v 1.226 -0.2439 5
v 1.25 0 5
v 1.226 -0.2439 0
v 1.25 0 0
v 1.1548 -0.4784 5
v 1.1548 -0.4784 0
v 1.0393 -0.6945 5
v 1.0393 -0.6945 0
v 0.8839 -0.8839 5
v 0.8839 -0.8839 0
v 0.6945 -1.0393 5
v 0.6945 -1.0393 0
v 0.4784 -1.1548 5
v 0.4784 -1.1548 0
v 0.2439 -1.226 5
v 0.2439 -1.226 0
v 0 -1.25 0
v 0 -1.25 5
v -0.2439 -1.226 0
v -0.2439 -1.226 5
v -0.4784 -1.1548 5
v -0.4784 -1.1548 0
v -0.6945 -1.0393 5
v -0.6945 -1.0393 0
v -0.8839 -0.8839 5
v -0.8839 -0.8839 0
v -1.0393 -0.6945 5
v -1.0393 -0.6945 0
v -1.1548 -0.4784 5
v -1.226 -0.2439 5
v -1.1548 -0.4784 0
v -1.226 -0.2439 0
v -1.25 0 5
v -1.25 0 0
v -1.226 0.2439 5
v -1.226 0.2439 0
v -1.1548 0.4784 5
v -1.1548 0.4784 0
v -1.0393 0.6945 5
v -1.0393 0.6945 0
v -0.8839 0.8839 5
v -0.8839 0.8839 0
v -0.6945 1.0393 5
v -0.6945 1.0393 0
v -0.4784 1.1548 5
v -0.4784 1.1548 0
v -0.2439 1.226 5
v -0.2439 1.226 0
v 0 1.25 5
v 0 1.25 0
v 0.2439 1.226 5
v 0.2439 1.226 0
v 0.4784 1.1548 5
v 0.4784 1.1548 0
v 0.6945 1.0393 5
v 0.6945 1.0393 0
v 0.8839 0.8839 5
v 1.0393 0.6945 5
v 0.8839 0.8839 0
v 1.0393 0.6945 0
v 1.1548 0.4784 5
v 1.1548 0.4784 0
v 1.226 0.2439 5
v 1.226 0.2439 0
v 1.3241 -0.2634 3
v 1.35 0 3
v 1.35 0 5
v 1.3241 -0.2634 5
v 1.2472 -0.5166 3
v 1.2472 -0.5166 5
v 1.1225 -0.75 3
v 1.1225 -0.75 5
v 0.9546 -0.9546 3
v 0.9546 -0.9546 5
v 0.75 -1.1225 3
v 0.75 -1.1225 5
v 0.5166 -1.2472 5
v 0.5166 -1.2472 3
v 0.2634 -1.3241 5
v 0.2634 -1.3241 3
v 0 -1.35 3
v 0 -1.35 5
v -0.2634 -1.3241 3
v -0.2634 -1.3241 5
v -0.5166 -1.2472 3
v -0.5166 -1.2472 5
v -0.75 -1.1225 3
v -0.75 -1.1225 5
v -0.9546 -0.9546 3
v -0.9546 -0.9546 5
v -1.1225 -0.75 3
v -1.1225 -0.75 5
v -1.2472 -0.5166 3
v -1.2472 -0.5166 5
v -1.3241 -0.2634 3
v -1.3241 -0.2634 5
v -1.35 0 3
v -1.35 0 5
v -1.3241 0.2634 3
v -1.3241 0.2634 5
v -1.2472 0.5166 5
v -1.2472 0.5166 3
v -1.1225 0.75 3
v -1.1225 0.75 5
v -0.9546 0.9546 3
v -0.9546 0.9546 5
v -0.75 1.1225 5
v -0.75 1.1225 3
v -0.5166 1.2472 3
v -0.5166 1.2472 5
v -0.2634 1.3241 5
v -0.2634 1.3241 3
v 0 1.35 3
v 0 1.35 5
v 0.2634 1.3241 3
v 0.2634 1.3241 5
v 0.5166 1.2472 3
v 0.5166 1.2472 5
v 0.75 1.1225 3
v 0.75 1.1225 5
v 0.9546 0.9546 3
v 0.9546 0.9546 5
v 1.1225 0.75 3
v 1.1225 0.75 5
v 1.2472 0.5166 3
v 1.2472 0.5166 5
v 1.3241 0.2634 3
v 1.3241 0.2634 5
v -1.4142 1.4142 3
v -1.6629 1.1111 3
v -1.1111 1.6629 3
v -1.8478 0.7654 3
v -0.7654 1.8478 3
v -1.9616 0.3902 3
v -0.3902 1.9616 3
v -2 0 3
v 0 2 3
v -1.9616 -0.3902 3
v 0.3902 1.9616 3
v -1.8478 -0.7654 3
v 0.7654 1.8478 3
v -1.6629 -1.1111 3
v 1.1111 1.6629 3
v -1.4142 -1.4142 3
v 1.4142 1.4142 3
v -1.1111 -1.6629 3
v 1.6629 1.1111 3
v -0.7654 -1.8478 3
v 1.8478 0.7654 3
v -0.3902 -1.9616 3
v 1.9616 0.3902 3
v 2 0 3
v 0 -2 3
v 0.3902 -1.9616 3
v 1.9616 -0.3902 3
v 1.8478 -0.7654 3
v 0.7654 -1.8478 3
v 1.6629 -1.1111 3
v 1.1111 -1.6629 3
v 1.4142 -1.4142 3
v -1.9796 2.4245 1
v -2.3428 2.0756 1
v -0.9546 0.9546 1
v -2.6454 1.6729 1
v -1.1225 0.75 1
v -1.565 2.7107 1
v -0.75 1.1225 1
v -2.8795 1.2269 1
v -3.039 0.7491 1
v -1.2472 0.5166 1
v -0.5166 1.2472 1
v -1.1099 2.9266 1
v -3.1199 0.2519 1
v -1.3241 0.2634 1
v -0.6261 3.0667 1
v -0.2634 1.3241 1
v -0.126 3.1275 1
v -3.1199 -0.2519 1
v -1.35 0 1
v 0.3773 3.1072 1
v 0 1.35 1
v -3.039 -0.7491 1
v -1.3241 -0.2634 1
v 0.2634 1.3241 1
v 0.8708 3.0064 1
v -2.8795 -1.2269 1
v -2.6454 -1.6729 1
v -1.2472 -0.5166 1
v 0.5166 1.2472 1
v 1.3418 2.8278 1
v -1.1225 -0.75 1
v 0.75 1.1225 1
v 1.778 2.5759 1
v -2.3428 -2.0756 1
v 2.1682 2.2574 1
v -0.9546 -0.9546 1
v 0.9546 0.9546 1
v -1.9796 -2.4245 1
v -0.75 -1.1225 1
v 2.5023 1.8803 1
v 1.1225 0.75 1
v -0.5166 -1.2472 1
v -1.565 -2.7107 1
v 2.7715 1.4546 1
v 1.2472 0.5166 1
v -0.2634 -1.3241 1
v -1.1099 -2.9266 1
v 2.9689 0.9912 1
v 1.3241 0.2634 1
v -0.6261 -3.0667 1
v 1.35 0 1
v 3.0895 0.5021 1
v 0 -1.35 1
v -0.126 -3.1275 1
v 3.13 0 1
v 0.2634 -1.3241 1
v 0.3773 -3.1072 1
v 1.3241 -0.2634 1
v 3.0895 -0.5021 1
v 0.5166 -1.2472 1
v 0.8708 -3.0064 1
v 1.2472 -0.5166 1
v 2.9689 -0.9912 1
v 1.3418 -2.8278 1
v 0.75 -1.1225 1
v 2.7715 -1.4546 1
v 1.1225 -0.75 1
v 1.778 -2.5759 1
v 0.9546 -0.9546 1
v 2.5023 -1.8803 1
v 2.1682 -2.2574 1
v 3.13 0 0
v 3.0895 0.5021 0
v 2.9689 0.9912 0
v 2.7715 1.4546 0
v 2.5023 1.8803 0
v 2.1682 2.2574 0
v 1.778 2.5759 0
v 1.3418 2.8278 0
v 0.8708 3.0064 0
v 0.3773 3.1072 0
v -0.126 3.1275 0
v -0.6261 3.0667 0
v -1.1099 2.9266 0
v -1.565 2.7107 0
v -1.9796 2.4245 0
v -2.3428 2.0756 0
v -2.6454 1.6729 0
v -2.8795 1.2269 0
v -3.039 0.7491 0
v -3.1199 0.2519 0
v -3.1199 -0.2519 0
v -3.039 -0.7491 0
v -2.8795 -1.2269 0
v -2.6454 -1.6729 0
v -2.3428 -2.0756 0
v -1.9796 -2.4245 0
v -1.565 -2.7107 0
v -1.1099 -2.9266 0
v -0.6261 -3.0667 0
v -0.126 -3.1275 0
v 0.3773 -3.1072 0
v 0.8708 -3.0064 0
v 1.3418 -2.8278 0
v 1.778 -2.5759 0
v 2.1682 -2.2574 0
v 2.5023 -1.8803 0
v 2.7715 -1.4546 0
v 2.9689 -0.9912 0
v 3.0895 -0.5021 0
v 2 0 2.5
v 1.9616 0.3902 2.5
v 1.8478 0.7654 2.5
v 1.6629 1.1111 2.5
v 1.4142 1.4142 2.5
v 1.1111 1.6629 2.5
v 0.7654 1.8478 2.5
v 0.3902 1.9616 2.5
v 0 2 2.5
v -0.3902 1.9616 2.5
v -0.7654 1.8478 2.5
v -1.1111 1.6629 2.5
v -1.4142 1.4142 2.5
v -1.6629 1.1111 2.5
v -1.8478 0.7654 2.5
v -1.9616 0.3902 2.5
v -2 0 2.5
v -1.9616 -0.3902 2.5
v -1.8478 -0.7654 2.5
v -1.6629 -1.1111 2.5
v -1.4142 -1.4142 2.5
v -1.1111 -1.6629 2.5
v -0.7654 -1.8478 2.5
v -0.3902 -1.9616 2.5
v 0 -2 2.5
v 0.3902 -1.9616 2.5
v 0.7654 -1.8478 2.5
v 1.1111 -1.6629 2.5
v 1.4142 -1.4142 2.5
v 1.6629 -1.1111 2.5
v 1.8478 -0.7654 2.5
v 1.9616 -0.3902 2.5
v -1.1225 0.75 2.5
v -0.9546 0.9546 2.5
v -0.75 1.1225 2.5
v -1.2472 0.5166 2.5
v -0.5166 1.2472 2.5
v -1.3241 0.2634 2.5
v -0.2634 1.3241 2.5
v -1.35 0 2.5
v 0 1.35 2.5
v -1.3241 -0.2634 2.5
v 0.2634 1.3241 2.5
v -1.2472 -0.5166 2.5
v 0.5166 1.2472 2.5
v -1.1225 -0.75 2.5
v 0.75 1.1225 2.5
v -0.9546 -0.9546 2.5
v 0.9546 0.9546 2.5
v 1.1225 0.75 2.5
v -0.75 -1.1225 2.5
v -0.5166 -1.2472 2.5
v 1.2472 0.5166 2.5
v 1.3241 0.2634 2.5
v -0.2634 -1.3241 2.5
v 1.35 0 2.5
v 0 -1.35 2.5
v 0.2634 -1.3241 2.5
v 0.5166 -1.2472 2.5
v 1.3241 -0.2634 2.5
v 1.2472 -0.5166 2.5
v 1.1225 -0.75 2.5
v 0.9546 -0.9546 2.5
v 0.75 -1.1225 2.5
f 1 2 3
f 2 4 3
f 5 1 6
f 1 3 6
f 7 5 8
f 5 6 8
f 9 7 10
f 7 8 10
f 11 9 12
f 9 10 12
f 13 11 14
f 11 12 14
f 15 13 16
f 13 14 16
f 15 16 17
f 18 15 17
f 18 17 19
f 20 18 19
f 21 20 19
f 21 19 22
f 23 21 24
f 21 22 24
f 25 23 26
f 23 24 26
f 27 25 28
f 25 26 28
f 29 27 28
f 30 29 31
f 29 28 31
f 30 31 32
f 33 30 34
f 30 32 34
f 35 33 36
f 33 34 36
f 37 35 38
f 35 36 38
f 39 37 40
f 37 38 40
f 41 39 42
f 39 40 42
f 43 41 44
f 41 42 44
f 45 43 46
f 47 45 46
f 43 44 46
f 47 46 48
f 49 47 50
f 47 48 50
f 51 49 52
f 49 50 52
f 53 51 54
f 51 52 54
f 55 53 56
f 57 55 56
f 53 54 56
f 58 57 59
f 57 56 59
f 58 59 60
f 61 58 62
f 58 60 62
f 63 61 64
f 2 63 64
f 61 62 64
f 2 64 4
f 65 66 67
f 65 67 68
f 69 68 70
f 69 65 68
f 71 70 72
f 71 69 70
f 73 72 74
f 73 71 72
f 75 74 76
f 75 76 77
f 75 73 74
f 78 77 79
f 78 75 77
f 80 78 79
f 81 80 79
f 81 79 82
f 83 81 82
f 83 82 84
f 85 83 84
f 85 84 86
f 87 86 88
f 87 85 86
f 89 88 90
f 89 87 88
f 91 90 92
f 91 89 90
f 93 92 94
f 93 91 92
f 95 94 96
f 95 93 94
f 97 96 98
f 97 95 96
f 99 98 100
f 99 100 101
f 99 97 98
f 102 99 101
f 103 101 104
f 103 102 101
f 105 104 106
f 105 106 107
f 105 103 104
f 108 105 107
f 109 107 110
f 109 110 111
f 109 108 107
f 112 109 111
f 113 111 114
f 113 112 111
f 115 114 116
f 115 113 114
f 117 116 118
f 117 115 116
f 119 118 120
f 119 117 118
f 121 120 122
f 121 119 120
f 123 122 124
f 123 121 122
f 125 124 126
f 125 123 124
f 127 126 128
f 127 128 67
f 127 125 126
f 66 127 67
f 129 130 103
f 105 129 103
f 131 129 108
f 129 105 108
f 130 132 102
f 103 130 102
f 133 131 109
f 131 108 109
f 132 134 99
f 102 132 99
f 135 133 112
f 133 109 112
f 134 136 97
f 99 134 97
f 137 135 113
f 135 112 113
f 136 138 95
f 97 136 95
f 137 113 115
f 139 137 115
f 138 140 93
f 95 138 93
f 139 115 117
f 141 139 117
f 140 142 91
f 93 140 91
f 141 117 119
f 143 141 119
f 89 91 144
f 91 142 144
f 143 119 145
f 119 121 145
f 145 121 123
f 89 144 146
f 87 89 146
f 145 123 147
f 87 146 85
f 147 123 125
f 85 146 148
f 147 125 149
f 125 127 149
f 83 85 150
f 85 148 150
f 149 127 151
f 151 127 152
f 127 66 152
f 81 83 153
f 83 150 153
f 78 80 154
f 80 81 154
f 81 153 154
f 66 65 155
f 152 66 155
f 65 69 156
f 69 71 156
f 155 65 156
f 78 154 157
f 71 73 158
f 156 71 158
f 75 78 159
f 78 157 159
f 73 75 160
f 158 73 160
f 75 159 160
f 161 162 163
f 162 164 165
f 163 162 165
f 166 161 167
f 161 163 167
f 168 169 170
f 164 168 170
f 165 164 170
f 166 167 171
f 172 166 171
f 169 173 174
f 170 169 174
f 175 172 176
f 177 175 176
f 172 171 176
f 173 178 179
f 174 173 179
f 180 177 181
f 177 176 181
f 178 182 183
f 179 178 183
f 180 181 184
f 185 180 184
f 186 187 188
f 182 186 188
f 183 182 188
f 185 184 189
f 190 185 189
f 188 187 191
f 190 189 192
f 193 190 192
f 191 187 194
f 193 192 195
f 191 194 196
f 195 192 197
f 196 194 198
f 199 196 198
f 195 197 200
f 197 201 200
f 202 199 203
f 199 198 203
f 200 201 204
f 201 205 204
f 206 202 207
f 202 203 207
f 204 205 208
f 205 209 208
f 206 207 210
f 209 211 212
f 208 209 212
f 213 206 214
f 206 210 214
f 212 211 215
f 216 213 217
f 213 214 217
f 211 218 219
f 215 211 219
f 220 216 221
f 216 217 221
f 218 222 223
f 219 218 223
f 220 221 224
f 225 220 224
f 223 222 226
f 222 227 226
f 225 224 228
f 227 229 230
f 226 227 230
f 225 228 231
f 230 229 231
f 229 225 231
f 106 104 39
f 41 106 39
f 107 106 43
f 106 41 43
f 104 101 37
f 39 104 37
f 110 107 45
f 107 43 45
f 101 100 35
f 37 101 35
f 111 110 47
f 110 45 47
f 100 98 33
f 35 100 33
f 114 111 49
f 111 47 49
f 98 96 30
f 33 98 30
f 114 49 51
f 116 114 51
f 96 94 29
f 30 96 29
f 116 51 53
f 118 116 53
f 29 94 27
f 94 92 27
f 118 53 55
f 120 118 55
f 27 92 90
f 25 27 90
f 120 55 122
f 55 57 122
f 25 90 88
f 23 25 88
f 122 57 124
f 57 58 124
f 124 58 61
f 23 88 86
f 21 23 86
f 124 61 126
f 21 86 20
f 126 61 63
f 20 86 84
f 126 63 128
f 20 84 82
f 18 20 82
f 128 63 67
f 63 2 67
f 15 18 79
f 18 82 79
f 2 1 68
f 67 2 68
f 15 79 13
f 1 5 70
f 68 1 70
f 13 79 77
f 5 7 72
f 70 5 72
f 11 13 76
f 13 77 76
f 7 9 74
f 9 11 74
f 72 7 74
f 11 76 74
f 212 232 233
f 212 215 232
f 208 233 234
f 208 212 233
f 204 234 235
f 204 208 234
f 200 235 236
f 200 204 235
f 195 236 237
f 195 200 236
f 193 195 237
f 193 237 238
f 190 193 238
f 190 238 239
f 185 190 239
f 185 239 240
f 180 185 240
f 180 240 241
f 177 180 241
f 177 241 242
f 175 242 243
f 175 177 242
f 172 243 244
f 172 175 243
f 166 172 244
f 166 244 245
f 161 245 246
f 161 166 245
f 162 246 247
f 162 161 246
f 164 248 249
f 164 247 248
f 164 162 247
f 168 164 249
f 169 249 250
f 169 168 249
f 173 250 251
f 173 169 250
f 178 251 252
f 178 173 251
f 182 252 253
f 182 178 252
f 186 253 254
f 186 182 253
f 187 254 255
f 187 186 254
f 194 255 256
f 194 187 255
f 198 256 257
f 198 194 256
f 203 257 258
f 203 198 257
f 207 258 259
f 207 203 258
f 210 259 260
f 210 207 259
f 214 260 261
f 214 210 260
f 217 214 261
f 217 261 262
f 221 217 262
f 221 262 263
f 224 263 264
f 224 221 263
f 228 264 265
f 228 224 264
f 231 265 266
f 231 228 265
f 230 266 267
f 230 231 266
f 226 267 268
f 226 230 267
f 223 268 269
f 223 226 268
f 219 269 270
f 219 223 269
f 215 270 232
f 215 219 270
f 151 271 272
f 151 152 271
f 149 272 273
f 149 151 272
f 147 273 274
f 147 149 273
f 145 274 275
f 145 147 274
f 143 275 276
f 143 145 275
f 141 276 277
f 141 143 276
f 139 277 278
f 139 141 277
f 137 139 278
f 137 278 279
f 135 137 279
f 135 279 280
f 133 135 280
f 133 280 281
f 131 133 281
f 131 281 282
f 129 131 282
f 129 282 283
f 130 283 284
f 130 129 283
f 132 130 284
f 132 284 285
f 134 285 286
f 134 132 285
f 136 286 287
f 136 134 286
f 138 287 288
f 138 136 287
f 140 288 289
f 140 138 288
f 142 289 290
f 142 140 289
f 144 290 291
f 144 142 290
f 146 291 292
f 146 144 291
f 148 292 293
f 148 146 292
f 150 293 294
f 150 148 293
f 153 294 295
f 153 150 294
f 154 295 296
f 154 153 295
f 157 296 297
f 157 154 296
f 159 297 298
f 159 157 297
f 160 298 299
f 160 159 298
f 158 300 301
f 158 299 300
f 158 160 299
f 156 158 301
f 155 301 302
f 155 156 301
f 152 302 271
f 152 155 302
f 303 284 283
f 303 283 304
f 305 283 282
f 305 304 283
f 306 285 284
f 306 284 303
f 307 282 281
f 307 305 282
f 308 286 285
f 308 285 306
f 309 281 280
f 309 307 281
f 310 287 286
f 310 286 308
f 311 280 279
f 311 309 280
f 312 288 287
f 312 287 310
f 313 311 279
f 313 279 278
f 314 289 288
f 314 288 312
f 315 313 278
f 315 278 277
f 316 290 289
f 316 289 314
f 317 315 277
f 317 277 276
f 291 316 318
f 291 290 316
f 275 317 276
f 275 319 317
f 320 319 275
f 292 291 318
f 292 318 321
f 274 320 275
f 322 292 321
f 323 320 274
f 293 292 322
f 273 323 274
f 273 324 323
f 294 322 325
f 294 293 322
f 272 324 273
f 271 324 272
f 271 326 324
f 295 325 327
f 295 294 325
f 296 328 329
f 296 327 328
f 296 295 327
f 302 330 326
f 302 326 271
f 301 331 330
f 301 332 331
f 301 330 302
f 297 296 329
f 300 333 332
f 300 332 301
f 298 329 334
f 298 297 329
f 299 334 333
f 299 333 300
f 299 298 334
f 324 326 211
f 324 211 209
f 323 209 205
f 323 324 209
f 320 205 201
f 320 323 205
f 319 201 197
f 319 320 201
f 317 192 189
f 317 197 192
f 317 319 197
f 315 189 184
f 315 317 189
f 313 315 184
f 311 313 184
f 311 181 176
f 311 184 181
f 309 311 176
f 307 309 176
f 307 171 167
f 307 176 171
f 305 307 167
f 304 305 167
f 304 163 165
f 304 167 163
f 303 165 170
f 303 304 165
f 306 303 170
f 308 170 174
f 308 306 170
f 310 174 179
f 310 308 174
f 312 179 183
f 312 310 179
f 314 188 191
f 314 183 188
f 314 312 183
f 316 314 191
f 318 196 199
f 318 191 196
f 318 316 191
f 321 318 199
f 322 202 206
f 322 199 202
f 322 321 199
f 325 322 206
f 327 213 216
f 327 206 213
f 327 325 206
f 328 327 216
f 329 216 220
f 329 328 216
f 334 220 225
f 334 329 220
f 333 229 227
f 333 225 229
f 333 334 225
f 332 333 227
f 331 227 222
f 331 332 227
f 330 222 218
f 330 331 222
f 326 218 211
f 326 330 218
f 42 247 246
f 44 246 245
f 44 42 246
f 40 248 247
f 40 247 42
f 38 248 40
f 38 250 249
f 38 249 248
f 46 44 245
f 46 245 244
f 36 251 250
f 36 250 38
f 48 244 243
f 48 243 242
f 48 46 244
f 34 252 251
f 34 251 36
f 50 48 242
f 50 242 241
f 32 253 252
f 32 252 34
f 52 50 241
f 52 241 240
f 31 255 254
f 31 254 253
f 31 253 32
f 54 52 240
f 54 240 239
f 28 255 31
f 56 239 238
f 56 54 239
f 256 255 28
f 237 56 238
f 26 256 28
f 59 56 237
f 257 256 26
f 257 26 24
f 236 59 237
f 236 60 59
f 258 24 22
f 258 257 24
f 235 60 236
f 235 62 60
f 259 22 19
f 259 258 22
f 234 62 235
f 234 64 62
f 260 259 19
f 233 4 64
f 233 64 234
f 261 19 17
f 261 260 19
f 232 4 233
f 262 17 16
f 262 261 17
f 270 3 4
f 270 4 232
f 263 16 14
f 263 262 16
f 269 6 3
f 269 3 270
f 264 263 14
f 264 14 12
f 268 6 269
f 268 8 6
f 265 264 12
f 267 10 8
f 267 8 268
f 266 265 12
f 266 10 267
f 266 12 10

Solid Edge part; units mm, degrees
sketch "Sketch1" plane through (0, 0, 0) normal (0, -1, 0) x (1, 0, 0)
  line L0 (3.13, 1) -> (1.35, 1)
  line L1 (1.35, 1) -> (1.35, 2.5)
  line L2 (1.35, 2.5) -> (2, 2.5)
  line L3 (2, 2.5) -> (2, 3)
  line L4 (1.35, 3) -> (2, 3)
  line L5 (1.35, 5) -> (1.35, 3)
  line L6 (1.35, 5) -> (1.25, 5)
  line L7 (1.25, 5) -> (1.25, 0)
  line L8 (1.25, 0) -> (3.13, 0)
  line L9 (3.13, 0) -> (3.13, 1)
revolve "RevolvedProtrusion1" add sketch "Sketch1" angle 360 about axis through (0, 0, 5) along (0, 0, -1)
properties material "Galvanized steel"
